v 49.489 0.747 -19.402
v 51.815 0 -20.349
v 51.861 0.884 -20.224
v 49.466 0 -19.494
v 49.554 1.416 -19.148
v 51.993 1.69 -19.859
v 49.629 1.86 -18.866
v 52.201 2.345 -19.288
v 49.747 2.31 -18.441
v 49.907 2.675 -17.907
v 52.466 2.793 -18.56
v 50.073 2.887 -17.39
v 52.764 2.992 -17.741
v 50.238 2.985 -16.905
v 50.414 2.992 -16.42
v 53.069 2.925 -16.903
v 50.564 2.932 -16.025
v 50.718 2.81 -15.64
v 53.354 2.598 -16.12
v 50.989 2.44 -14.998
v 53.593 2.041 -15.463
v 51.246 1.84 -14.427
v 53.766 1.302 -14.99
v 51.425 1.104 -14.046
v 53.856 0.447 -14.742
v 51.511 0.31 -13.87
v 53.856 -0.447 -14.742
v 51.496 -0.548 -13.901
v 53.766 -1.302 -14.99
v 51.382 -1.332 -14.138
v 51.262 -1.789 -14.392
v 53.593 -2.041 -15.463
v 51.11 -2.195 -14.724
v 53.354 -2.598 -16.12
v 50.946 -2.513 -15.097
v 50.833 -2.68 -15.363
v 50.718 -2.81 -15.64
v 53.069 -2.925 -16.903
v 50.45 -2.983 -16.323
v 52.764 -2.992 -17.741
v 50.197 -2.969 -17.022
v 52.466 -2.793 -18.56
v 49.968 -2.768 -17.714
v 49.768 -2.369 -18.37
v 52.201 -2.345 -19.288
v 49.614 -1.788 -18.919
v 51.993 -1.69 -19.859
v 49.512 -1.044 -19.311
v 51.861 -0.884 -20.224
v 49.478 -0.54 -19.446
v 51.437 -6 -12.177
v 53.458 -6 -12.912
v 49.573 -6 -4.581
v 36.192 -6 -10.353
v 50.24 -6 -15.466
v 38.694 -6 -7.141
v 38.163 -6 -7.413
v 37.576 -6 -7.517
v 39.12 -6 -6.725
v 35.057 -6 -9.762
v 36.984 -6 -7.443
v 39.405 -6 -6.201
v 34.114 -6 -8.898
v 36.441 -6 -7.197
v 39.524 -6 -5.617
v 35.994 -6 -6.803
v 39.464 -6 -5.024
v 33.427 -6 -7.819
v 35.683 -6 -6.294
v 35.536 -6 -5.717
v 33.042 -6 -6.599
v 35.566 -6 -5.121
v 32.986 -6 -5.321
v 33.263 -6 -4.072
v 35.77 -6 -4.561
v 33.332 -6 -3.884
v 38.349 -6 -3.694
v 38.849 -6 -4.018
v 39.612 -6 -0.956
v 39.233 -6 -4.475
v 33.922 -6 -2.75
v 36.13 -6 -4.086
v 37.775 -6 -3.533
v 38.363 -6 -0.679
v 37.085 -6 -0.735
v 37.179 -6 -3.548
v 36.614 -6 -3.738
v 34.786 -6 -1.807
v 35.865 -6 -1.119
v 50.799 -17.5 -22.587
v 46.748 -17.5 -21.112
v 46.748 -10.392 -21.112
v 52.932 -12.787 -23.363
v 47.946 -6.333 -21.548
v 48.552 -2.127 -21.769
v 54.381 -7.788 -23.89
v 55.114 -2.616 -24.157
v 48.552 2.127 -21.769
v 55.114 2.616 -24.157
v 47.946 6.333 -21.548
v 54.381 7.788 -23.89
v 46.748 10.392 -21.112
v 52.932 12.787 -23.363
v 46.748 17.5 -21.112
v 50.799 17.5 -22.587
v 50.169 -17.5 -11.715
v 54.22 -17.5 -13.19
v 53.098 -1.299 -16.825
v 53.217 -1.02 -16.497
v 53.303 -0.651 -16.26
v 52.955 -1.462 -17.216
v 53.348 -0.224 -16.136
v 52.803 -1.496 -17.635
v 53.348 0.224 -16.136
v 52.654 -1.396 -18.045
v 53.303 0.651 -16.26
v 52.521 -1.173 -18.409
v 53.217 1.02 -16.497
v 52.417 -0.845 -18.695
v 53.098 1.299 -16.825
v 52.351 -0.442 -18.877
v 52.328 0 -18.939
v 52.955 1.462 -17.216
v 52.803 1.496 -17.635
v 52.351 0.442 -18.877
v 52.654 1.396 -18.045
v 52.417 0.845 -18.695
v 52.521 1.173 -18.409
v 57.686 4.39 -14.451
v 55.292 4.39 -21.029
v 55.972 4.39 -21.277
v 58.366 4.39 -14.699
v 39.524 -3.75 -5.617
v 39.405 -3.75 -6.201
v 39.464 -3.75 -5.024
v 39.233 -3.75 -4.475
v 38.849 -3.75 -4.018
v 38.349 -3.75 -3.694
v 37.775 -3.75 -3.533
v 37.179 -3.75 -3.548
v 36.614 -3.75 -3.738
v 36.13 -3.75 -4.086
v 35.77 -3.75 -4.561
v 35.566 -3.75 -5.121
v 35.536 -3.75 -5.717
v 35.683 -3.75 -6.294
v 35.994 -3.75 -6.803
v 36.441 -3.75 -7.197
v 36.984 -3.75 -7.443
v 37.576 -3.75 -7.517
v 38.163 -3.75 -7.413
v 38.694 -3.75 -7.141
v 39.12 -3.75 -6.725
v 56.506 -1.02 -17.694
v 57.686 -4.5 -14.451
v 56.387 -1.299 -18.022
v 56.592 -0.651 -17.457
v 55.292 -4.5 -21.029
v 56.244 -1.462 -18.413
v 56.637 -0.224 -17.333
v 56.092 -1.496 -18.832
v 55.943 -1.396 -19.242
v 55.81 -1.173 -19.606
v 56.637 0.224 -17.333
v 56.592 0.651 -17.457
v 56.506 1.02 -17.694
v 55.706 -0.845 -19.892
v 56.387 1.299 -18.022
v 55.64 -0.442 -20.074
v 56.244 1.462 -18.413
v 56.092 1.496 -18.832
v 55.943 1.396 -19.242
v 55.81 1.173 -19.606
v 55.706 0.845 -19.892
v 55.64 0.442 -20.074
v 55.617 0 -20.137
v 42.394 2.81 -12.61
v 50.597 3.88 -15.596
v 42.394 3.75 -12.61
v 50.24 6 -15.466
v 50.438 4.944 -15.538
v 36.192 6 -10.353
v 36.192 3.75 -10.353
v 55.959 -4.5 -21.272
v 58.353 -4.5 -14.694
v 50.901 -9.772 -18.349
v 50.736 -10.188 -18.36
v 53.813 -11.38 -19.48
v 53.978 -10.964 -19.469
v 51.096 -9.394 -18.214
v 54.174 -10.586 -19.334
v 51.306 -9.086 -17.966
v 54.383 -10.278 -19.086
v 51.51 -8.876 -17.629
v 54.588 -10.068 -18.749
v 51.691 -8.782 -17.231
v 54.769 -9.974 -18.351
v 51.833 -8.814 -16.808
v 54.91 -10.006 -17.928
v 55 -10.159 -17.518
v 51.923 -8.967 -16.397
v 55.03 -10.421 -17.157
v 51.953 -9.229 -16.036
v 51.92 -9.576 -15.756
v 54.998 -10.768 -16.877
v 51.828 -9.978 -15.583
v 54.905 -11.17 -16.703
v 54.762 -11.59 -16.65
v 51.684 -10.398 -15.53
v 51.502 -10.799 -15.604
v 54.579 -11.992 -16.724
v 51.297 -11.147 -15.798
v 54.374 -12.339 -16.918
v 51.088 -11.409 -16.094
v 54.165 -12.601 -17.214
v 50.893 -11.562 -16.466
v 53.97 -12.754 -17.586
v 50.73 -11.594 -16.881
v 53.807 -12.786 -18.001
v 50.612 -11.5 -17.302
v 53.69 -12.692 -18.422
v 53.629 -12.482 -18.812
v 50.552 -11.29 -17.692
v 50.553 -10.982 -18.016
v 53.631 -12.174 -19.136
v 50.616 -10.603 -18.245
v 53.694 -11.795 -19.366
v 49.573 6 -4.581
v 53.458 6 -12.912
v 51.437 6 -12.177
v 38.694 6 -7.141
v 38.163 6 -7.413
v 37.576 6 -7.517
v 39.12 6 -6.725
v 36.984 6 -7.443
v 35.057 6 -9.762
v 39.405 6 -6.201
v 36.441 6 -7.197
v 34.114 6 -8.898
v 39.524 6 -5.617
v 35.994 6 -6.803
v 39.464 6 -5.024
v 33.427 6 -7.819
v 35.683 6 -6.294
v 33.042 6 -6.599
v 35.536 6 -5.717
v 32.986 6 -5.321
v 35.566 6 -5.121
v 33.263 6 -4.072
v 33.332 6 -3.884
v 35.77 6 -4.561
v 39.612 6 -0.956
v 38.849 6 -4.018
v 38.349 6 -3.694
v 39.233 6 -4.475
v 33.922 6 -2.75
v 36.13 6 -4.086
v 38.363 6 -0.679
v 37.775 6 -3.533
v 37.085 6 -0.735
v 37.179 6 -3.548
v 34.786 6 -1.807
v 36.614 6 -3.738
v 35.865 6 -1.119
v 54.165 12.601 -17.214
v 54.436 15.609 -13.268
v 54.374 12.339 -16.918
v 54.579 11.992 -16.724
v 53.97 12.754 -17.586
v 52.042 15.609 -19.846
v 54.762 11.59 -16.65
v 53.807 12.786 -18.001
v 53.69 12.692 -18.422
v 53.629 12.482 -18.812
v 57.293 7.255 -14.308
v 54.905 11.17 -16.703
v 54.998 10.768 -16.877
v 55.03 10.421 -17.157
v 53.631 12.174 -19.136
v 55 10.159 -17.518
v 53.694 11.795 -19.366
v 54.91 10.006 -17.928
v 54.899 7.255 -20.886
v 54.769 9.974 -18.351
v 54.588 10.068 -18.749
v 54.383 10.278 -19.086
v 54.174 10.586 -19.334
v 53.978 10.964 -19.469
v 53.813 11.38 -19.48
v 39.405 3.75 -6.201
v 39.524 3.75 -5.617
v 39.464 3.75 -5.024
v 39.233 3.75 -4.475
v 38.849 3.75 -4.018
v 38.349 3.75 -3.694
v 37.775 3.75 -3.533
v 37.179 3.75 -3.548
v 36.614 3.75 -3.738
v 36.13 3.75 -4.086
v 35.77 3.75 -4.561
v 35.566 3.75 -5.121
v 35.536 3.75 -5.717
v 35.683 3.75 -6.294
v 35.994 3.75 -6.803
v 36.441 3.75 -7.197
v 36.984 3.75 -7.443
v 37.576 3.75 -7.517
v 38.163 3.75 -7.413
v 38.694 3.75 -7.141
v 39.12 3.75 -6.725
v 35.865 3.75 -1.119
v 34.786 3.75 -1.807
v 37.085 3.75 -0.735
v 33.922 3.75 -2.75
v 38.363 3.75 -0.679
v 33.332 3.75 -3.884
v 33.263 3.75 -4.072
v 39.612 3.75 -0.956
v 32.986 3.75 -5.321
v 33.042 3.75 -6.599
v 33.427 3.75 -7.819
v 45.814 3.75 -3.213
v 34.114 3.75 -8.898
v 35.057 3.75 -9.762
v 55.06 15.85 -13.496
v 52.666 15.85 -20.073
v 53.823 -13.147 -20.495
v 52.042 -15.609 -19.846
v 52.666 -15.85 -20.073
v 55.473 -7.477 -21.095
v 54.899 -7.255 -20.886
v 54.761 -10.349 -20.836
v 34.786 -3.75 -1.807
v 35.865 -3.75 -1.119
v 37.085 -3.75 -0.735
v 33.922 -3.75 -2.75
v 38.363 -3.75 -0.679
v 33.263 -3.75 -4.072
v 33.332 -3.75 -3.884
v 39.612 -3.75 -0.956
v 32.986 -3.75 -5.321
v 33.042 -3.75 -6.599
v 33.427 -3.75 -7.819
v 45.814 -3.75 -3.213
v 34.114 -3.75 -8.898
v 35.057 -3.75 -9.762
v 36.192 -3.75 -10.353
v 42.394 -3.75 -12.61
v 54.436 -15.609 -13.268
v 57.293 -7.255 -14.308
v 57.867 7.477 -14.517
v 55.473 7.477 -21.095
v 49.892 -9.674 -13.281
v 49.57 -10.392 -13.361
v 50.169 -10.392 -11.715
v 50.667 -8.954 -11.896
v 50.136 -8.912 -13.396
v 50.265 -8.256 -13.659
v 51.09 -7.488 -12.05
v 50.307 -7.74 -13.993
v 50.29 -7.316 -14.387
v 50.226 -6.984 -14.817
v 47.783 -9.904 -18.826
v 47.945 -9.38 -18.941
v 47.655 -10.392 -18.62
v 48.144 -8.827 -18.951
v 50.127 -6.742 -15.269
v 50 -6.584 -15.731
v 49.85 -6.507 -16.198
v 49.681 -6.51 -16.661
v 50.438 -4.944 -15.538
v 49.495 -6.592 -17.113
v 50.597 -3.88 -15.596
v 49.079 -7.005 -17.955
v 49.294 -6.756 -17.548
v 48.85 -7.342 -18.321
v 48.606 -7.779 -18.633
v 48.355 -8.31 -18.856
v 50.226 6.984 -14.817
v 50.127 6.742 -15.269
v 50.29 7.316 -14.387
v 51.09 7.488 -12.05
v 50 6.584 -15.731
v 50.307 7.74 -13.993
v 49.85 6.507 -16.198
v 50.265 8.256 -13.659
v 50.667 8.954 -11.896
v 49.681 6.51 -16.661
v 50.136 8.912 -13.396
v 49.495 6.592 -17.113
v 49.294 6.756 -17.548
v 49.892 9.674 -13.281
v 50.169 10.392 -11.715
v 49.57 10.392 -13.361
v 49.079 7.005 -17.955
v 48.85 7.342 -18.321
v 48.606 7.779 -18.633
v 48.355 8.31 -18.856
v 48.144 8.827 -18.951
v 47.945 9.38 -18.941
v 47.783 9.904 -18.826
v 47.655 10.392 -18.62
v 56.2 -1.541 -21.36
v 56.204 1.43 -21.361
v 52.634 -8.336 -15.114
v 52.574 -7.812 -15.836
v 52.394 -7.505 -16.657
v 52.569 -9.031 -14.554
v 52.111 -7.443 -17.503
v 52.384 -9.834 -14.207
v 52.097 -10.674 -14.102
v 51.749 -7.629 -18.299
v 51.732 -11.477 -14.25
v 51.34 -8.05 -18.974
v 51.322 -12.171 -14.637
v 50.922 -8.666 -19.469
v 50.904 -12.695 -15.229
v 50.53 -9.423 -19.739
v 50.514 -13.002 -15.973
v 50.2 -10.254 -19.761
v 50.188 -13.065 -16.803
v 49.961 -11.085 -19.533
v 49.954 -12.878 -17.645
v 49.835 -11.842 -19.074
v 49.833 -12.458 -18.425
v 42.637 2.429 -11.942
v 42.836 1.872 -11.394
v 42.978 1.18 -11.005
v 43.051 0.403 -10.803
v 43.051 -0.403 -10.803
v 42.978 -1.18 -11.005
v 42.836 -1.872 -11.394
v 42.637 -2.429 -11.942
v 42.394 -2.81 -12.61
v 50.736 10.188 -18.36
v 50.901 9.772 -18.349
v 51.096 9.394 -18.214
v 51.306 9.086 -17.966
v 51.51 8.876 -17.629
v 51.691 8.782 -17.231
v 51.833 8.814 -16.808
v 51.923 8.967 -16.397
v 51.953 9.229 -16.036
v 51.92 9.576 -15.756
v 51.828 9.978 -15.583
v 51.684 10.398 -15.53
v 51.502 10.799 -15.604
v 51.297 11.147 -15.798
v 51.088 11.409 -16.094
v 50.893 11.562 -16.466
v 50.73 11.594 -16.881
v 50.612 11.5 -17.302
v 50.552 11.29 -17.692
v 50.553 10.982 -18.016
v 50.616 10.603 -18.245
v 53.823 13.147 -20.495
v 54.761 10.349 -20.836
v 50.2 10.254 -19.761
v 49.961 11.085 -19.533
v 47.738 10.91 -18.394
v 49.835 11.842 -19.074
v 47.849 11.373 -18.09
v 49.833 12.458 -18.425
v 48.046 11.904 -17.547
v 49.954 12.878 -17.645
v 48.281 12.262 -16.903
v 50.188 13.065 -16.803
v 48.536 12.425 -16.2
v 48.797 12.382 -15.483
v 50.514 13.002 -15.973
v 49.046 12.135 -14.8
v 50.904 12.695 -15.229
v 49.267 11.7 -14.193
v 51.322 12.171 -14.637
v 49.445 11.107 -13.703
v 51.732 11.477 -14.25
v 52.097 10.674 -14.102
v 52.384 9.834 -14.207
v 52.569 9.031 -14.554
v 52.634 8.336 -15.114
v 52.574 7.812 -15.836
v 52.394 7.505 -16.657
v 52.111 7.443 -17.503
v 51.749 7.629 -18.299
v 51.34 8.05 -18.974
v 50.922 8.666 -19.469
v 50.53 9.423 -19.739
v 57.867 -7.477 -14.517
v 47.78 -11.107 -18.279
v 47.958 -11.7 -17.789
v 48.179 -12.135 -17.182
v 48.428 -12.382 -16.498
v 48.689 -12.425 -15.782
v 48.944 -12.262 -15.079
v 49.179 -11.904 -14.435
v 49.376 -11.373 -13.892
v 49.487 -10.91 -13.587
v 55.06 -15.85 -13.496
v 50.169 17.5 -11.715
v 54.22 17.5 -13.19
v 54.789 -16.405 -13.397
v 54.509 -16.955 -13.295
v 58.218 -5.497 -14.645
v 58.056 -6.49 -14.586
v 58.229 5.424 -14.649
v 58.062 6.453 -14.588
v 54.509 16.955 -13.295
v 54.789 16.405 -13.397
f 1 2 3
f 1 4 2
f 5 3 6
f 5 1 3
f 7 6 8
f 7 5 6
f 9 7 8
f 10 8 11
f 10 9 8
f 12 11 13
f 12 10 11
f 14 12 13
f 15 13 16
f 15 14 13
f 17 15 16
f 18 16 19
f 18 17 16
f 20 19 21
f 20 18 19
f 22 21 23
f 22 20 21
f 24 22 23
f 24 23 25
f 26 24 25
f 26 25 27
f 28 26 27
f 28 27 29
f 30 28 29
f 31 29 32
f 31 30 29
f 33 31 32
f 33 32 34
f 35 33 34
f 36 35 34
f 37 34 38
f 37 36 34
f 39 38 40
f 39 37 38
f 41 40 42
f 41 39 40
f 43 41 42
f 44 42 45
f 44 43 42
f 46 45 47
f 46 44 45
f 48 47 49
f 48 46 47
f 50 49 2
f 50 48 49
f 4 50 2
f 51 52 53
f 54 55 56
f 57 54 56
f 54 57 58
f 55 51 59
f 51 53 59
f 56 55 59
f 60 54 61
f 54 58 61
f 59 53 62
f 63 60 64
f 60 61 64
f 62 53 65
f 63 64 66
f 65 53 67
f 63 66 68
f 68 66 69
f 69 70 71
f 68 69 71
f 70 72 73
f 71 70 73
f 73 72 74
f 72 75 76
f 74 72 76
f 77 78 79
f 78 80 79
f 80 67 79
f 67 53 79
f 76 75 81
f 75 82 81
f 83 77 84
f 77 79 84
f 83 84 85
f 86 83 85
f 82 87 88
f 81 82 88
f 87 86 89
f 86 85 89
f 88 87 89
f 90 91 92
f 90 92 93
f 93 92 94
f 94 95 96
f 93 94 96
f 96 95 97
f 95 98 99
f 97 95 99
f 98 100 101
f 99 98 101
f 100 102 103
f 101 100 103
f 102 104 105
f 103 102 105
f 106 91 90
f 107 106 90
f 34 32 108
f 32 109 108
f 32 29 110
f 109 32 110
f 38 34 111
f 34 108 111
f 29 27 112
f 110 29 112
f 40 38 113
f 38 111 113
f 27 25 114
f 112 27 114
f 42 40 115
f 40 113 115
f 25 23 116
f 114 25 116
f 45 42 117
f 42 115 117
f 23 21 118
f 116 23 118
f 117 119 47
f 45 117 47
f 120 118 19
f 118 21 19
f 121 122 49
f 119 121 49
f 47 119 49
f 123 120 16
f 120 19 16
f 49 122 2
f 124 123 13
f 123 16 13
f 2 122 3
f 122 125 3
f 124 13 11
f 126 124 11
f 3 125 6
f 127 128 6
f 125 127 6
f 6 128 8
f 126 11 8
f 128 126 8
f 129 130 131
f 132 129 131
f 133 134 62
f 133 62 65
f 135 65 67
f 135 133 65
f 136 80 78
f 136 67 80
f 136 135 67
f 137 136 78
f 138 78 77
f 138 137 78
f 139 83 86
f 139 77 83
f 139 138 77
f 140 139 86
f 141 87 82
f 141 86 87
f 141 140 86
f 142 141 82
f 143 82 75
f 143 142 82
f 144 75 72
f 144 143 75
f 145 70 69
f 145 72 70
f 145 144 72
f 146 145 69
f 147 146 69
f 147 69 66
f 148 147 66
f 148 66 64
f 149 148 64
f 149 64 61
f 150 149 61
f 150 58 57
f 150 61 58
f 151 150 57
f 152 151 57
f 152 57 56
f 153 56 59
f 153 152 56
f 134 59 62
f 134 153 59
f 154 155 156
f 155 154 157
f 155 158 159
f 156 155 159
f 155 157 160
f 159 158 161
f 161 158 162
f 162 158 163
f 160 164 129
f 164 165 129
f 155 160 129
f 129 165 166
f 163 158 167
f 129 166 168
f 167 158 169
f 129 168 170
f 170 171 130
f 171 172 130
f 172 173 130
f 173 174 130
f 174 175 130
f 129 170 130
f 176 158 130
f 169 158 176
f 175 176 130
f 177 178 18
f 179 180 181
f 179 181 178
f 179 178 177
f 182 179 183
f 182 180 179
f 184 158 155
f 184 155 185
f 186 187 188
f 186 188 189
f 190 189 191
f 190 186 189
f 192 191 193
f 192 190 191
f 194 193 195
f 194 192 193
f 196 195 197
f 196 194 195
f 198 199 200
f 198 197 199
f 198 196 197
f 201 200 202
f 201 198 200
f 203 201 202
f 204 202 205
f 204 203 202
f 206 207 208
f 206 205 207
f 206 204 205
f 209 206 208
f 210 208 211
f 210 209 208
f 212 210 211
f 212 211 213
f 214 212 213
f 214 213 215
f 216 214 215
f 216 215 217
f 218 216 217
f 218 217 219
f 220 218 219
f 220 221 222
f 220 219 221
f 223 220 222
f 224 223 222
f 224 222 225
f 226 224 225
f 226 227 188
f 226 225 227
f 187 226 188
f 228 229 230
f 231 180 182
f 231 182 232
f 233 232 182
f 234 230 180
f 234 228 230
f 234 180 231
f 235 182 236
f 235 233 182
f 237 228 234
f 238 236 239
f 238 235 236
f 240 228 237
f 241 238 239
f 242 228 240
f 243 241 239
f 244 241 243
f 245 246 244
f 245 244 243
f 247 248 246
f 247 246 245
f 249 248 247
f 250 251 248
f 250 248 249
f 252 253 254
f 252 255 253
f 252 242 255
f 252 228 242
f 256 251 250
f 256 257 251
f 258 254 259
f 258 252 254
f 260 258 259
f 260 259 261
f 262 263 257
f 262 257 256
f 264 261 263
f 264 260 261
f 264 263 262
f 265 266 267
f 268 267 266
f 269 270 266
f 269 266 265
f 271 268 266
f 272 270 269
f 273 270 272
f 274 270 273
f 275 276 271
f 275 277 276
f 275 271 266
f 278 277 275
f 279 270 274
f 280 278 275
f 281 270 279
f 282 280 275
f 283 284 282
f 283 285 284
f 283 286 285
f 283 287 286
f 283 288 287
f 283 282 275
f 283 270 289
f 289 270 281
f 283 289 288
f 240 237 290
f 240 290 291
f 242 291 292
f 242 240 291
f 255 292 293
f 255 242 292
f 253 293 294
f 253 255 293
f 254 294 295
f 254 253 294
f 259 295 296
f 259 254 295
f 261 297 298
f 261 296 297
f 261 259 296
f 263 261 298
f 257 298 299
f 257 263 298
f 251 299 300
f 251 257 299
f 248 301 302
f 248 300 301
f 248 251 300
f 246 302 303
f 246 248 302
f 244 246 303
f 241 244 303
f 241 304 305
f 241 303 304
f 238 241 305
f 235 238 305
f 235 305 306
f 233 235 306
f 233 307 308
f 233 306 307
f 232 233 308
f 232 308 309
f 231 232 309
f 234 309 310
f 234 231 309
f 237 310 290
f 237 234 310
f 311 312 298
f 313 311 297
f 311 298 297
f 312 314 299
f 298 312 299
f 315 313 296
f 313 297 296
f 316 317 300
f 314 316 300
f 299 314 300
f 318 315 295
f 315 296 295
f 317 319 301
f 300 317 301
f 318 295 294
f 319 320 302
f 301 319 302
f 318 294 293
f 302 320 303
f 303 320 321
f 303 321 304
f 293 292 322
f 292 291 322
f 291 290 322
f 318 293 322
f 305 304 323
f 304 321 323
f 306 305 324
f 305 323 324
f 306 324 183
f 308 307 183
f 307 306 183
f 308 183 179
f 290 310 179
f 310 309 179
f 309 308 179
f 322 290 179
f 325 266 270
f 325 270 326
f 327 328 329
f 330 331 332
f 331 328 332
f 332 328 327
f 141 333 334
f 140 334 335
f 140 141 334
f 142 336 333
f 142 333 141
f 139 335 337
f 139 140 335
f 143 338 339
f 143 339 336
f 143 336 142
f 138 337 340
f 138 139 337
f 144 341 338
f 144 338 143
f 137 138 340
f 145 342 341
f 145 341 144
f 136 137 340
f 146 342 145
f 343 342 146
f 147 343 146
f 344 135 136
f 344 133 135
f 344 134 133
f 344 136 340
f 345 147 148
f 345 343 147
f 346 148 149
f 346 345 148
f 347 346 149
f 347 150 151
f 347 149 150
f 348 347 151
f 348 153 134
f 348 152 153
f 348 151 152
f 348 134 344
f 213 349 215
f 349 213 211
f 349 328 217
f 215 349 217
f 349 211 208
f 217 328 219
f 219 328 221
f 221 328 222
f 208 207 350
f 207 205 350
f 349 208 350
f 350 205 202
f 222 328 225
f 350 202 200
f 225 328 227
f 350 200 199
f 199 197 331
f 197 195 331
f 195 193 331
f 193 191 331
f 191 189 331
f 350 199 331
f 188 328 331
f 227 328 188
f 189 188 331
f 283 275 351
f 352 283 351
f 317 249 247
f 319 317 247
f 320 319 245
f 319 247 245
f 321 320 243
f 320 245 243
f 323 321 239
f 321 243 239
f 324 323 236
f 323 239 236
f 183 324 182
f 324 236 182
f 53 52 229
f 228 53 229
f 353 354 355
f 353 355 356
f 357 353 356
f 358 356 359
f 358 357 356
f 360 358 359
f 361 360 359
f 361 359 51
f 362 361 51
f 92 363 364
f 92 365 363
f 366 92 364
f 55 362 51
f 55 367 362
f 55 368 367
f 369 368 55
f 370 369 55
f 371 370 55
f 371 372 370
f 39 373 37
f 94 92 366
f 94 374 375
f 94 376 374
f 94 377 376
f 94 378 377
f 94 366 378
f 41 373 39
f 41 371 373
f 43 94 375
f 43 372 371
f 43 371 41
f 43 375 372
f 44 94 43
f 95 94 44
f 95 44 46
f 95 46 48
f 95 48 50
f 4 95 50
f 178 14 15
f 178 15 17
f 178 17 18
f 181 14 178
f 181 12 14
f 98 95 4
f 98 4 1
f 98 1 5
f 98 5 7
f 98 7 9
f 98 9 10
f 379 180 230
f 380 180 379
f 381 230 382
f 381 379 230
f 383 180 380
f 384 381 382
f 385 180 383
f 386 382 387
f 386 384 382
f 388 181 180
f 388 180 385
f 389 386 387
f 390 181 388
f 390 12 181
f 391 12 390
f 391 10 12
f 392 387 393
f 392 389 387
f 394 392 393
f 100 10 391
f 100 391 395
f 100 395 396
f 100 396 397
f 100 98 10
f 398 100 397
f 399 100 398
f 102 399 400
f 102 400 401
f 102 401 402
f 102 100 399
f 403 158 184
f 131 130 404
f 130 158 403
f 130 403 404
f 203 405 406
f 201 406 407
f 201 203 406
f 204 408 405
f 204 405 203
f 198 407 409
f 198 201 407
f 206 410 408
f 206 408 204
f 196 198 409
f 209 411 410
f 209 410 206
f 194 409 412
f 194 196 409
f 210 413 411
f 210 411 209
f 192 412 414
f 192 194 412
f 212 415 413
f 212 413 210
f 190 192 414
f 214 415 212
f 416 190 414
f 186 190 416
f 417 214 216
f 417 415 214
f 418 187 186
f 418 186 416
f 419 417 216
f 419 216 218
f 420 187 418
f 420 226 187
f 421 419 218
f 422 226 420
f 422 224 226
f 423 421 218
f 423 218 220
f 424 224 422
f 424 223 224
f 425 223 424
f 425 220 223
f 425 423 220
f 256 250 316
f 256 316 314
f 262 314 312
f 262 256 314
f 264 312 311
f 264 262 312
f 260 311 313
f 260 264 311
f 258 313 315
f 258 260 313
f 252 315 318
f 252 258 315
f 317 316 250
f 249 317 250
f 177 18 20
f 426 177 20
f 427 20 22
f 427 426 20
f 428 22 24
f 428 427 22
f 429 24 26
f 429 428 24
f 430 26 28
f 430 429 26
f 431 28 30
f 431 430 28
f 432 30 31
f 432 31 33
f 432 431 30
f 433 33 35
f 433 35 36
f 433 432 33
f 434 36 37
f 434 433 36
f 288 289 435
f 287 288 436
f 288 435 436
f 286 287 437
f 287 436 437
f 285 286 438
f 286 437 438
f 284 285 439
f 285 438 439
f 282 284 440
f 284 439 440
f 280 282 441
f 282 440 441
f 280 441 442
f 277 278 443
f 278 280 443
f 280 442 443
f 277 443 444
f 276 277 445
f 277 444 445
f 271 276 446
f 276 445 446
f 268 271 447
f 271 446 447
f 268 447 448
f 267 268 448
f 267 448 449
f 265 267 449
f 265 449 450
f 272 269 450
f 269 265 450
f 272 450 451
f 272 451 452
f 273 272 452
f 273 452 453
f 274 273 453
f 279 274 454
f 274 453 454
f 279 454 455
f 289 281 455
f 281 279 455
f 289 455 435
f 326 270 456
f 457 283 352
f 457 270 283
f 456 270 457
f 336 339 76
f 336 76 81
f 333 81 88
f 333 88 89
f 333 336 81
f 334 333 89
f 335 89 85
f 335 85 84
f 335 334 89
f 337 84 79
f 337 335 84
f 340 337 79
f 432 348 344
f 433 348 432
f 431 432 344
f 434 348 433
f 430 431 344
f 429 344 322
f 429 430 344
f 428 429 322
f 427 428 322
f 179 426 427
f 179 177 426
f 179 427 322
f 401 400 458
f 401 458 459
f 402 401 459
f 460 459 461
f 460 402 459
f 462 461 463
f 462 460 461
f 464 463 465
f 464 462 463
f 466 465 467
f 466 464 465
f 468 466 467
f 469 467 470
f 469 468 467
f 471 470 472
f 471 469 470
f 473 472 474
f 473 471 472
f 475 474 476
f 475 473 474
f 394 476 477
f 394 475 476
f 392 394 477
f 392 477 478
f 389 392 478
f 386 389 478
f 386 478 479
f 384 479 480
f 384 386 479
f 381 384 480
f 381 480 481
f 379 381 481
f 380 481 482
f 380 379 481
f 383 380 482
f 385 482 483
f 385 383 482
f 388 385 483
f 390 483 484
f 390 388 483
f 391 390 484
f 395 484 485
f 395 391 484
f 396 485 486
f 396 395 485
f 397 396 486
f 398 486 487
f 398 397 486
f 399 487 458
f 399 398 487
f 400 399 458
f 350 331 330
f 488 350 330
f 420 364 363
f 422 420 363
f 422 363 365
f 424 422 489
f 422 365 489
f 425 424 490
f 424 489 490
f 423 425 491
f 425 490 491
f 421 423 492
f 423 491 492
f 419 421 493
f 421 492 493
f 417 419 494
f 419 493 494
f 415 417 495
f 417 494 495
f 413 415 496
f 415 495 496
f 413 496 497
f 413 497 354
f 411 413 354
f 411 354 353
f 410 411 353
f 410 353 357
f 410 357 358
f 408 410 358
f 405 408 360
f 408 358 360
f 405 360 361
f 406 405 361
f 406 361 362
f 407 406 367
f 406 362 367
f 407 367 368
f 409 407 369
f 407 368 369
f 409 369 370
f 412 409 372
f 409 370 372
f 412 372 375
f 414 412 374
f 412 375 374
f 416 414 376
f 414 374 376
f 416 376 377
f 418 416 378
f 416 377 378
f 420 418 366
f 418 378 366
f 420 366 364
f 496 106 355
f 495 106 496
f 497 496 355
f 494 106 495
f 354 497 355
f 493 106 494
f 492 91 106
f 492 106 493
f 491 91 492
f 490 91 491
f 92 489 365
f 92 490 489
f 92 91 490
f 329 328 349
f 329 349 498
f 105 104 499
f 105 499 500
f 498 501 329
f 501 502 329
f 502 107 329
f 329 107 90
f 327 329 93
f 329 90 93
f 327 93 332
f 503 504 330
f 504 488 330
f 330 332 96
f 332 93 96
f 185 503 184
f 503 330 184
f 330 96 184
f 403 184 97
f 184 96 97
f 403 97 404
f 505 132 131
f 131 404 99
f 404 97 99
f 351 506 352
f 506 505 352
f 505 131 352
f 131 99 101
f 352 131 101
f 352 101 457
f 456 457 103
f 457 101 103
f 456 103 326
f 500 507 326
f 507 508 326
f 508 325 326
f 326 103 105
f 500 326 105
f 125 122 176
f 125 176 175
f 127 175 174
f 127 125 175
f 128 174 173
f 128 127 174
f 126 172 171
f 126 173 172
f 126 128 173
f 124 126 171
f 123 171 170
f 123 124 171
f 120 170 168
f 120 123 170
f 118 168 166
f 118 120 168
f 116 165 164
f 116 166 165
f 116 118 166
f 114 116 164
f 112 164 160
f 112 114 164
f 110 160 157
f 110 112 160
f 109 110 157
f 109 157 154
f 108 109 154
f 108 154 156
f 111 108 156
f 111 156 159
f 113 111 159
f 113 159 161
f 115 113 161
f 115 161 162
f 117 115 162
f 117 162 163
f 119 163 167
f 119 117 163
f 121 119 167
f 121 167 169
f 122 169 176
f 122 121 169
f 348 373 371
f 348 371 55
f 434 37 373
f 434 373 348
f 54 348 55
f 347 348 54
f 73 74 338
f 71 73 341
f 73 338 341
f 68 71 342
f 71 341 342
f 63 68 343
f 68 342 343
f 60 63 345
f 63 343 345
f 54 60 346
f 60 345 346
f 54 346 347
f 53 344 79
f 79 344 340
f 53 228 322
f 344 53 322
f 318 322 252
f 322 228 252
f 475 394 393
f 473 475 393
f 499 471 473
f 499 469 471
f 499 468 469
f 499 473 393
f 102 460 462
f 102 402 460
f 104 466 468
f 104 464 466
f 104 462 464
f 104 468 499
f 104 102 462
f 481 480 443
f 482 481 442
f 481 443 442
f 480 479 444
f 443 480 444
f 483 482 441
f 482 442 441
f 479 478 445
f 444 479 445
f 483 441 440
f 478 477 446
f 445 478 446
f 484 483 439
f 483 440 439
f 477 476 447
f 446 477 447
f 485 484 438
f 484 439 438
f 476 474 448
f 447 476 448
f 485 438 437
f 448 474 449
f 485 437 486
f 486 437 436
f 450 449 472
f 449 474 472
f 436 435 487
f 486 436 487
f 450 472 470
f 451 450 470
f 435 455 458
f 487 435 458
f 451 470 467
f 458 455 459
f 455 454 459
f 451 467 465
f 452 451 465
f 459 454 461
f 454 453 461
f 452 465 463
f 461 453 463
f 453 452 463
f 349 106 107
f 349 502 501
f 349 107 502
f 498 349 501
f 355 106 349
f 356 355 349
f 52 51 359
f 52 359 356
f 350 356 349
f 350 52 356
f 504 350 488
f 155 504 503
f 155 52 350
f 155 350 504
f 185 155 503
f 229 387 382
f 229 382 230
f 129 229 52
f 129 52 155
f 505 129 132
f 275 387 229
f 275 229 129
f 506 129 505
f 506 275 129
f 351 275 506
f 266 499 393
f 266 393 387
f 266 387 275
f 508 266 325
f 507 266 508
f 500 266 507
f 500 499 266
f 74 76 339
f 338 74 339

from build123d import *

# Parameters (mm, degrees)
CYLINDER282_R               = 3
CYLINDER282_DEPTH           = 12
BOX184_W                    = 16
BOX184_H                    = 7.5
BOX184_DEPTH                = 12
CYLINDER271_R               = 2
CYLINDER271_DEPTH           = 15
BOX185_W                    = 22
BOX185_H                    = 12
BOX185_DEPTH                = 10
FILLET120_R                 = 4.9
FILLET120_PLACEMENT_ANGLE   = 180
CHAMFER035_SIZE             = 6.5
CYLINDER275_R               = 1.5
CYLINDER275_DEPTH           = 18
BOX194_W                    = 2
BOX194_H                    = 8.89
BOX194_DEPTH                = 21.59
FUSION188_PLACEMENT_ANGLE   = 20
CYLINDER276_R               = 1.5
CYLINDER276_DEPTH           = 18
BOX195_W                    = 2
BOX195_H                    = 8.89
BOX195_DEPTH                = 21.59
FUSION189_PLACEMENT_ANGLE   = 20
CYLINDER272_R               = 1.5
CYLINDER272_DEPTH           = 18
BOX186_W                    = 2
BOX186_H                    = 8.89
BOX186_DEPTH                = 21.59
CYLINDER280_R               = 3
CYLINDER280_DEPTH           = 12
CYLINDER281_R               = 3
CYLINDER281_DEPTH           = 8
CYLINDER281_PITCH_ANGLE     = 90
CYLINDER281_PLACEMENT_ANGLE = 20
CYLINDER279_R               = 3
CYLINDER279_DEPTH           = 8
CYLINDER279_PITCH_ANGLE     = 90
CYLINDER279_PLACEMENT_ANGLE = 20
BOX190_W                    = 10
BOX190_H                    = 10
BOX190_DEPTH                = 12
BOX191_W                    = 10
BOX191_H                    = 10
BOX191_DEPTH                = 12
BOX189_W                    = 62
BOX189_H                    = 73
BOX189_DEPTH                = 12
TUBE_R                      = 35
TUBE_R_2                    = 28
TUBE_DEPTH                  = 10
FUSION196_PLACEMENT_ANGLE   = 20


with BuildPart() as zylinder284:
    # Cylinder282 → Cylinder282 (new body)
    with BuildSketch(Plane(origin=(44, 0, -11.55), x_dir=(0, 0, -1), z_dir=(1, 0, 0))):
        Circle(CYLINDER282_R)
    extrude(amount=CYLINDER282_DEPTH)


with BuildPart() as w_rfel173:
    # Box184 → Box184 (new body)
    with BuildSketch(Plane(origin=(28.5, -3.75, -11.5), x_dir=(1, 0, 0), z_dir=(0, 0, 1))):
        with Locations((8, 3.75)):
            Rectangle(BOX184_W, BOX184_H)
    extrude(amount=BOX184_DEPTH)


with BuildPart() as fusion185:
    # Cylinder271 → Cylinder271 (new body)
    with BuildSketch(Plane(origin=(37.5, 7.5, -5.5), x_dir=(1, 0, 0), z_dir=(0, -1, 0))):
        Circle(CYLINDER271_R)
    extrude(amount=CYLINDER271_DEPTH)

    # Fusion185: union Würfel173
    add(w_rfel173.part)


with BuildPart() as cut132:
    # Box185 → Box185 (new body)
    with BuildSketch(Plane(origin=(27, -3.5, -10.5), x_dir=(1, 0, 0), z_dir=(0, 0, 1))):
        with Locations((11, 6)):
            Rectangle(BOX185_W, BOX185_H)
    extrude(amount=BOX185_DEPTH)

    # Fillet120
    fillet120_edges = [cut132.edges().sort_by_distance(p)[0] for p in [
        (49, 2.5, -0.5),
        (49, 2.5, -10.5),
    ]]
    fillet(fillet120_edges, radius=FILLET120_R)


with BuildPart() as cut132_1:
    # Fillet120 placement: moved
    add(cut132.part.moved(Location((82, -2.5, -11))).rotate(Axis((82, -2.5, -11), (0, 1, 0)), FILLET120_PLACEMENT_ANGLE))

    # Cut122: cut Fusion185
    add(fusion185.part, mode=Mode.SUBTRACT)

    # Chamfer035
    chamfer035_edges = [cut132_1.edges().sort_by_distance(p)[0] for p in [
        (55, 0, -0.5),
    ]]
    chamfer(chamfer035_edges, length=CHAMFER035_SIZE)

    # Cut132: cut Zylinder284
    add(zylinder284.part, mode=Mode.SUBTRACT)


with BuildPart() as zylinder277:
    # Cylinder275 → Cylinder275 (new body)
    with BuildSketch(Plane(origin=(48, 0, -11.55), x_dir=(0, 0, -1), z_dir=(1, 0, 0))):
        Circle(CYLINDER275_R)
    extrude(amount=CYLINDER275_DEPTH)


with BuildPart() as fusion188:
    # Box194 → Box194 (new body)
    with BuildSketch(Plane(origin=(61.5, -4.5, -14), x_dir=(1, 0, 0), z_dir=(0, 0, 1))):
        with Locations((1, 4.445)):
            Rectangle(BOX194_W, BOX194_H)
    extrude(amount=BOX194_DEPTH)

    # Fusion188: union Zylinder277
    add(zylinder277.part)


with BuildPart() as fusion188_1:
    # Fusion188 placement: moved
    add(fusion188.part.moved(Location((-0.210743, 9.654304, 0))).rotate(Axis((-0.210743, 9.654304, 0), (0, 0, -1)), FUSION188_PLACEMENT_ANGLE))


with BuildPart() as zylinder278:
    # Cylinder276 → Cylinder276 (new body)
    with BuildSketch(Plane(origin=(48, 0, -11.55), x_dir=(0, 0, -1), z_dir=(1, 0, 0))):
        Circle(CYLINDER276_R)
    extrude(amount=CYLINDER276_DEPTH)


with BuildPart() as fusion189:
    # Box195 → Box195 (new body)
    with BuildSketch(Plane(origin=(61.5, -4.5, -14), x_dir=(1, 0, 0), z_dir=(0, 0, 1))):
        with Locations((1, 4.445)):
            Rectangle(BOX195_W, BOX195_H)
    extrude(amount=BOX195_DEPTH)

    # Fusion189: union Zylinder278
    add(zylinder278.part)


with BuildPart() as fusion189_1:
    # Fusion189 placement: moved
    add(fusion189.part.moved(Location((-0.210743, 9.654304, 0))).rotate(Axis((-0.210743, 9.654304, 0), (0, 0, -1)), FUSION189_PLACEMENT_ANGLE))


with BuildPart() as part_mirroring007:
    # Part__Mirroring007: instance of Fusion189
    add(fusion189_1.part.mirror(Plane(origin=(0, 0, 0), x_dir=(1, 0, 0), z_dir=(0, 1, 0))))


with BuildPart() as zylinder274:
    # Cylinder272 → Cylinder272 (new body)
    with BuildSketch(Plane(origin=(48, 0, -11.55), x_dir=(0, 0, -1), z_dir=(1, 0, 0))):
        Circle(CYLINDER272_R)
    extrude(amount=CYLINDER272_DEPTH)


with BuildPart() as fusion193:
    # Box186 → Box186 (new body)
    with BuildSketch(Plane(origin=(61.5, -4.5, -14), x_dir=(1, 0, 0), z_dir=(0, 0, 1))):
        with Locations((1, 4.445)):
            Rectangle(BOX186_W, BOX186_H)
    extrude(amount=BOX186_DEPTH)

    # Fusion187: union Zylinder274
    add(zylinder274.part)


with BuildPart() as fusion193_1:
    # Fusion187 placement: moved
    add(fusion193.part.moved(Location((-2, 0, 0))))

    # Fusion193: union Fusion188, Part__Mirroring007
    add(fusion188_1.part)
    add(part_mirroring007.part)


with BuildPart() as zylinder282:
    # Cylinder280 → Cylinder280 (new body)
    with BuildSketch(Plane(origin=(44, 0, -11.55), x_dir=(0, 0, -1), z_dir=(1, 0, 0))):
        Circle(CYLINDER280_R)
    extrude(amount=CYLINDER280_DEPTH)


with BuildPart() as zylinder283:
    # Cylinder281 → Cylinder281 (new body)
    with BuildSketch(Plane.XY):
        Circle(CYLINDER281_R)
    extrude(amount=CYLINDER281_DEPTH)


with BuildPart() as zylinder283_1:
    # Cylinder281 pitch: moved
    add(zylinder283.part.rotate(Axis((0, 0, 0), (0, 1, 0)), CYLINDER281_PITCH_ANGLE))


with BuildPart() as zylinder283_2:
    # Cylinder281 placement: moved
    add(zylinder283_1.part.moved(Location((46.763839, 7.517541, -11.55))).rotate(Axis((46.763839, 7.517541, -11.55), (0, 0, 1)), CYLINDER281_PLACEMENT_ANGLE))


with BuildPart() as zylinder281:
    # Cylinder279 → Cylinder279 (new body)
    with BuildSketch(Plane.XY):
        Circle(CYLINDER279_R)
    extrude(amount=CYLINDER279_DEPTH)


with BuildPart() as zylinder281_1:
    # Cylinder279 pitch: moved
    add(zylinder281.part.rotate(Axis((0, 0, 0), (0, 1, 0)), CYLINDER279_PITCH_ANGLE))


with BuildPart() as zylinder281_2:
    # Cylinder279 placement: moved
    add(zylinder281_1.part.moved(Location((46.763839, 7.517541, -11.55))).rotate(Axis((46.763839, 7.517541, -11.55), (0, 0, 1)), CYLINDER279_PLACEMENT_ANGLE))


with BuildPart() as fusion195:
    # Part__Mirroring009: instance of Zylinder281
    add(zylinder281_2.part.mirror(Plane(origin=(0, 0, 0), x_dir=(1, 0, 0), z_dir=(0, 1, 0))))

    # Fusion195: union Zylinder282, Zylinder283
    add(zylinder282.part)
    add(zylinder283_2.part)


with BuildPart() as w_rfel179:
    # Box190 → Box190 (new body)
    with BuildSketch(Plane(origin=(47.5, -27.5, -18), x_dir=(1, 0, 0), z_dir=(0, 0, 1))):
        with Locations((5, 5)):
            Rectangle(BOX190_W, BOX190_H)
    extrude(amount=BOX190_DEPTH)


with BuildPart() as w_rfel180:
    # Box191 → Box191 (new body)
    with BuildSketch(Plane(origin=(47.5, 17.5, -18), x_dir=(1, 0, 0), z_dir=(0, 0, 1))):
        with Locations((5, 5)):
            Rectangle(BOX191_W, BOX191_H)
    extrude(amount=BOX191_DEPTH)


with BuildPart() as fusion186:
    # Box189 → Box189 (new body)
    with BuildSketch(Plane(origin=(-10.5, -37, -18), x_dir=(1, 0, 0), z_dir=(0, 0, 1))):
        with Locations((31, 36.5)):
            Rectangle(BOX189_W, BOX189_H)
    extrude(amount=BOX189_DEPTH)

    # Fusion186: union Würfel179, Würfel180
    add(w_rfel179.part)
    add(w_rfel180.part)


with BuildPart() as sensor_tof:
    # Tube → Tube (new body)
    with BuildSketch(Plane(origin=(25.5, 0, -17), x_dir=(1, 0, 0), z_dir=(0, 0, 1))):
        Circle(TUBE_R)
        Circle(TUBE_R_2, mode=Mode.SUBTRACT)
    extrude(amount=TUBE_DEPTH)

    # Cut126: cut Fusion186
    add(fusion186.part, mode=Mode.SUBTRACT)

    # Cut130: cut Fusion195
    add(fusion195.part, mode=Mode.SUBTRACT)

    # Cut131: cut Fusion193
    add(fusion193_1.part, mode=Mode.SUBTRACT)

    # Fusion196: union Cut132
    add(cut132_1.part)


with BuildPart() as sensor_tof_1:
    # Fusion196 placement: moved
    add(sensor_tof.part.moved(Location((4.168672, 0, 12.476665))).rotate(Axis((4.168672, 0, 12.476665), (0, 1, 0)), FUSION196_PLACEMENT_ANGLE))


solid = sensor_tof_1.part
